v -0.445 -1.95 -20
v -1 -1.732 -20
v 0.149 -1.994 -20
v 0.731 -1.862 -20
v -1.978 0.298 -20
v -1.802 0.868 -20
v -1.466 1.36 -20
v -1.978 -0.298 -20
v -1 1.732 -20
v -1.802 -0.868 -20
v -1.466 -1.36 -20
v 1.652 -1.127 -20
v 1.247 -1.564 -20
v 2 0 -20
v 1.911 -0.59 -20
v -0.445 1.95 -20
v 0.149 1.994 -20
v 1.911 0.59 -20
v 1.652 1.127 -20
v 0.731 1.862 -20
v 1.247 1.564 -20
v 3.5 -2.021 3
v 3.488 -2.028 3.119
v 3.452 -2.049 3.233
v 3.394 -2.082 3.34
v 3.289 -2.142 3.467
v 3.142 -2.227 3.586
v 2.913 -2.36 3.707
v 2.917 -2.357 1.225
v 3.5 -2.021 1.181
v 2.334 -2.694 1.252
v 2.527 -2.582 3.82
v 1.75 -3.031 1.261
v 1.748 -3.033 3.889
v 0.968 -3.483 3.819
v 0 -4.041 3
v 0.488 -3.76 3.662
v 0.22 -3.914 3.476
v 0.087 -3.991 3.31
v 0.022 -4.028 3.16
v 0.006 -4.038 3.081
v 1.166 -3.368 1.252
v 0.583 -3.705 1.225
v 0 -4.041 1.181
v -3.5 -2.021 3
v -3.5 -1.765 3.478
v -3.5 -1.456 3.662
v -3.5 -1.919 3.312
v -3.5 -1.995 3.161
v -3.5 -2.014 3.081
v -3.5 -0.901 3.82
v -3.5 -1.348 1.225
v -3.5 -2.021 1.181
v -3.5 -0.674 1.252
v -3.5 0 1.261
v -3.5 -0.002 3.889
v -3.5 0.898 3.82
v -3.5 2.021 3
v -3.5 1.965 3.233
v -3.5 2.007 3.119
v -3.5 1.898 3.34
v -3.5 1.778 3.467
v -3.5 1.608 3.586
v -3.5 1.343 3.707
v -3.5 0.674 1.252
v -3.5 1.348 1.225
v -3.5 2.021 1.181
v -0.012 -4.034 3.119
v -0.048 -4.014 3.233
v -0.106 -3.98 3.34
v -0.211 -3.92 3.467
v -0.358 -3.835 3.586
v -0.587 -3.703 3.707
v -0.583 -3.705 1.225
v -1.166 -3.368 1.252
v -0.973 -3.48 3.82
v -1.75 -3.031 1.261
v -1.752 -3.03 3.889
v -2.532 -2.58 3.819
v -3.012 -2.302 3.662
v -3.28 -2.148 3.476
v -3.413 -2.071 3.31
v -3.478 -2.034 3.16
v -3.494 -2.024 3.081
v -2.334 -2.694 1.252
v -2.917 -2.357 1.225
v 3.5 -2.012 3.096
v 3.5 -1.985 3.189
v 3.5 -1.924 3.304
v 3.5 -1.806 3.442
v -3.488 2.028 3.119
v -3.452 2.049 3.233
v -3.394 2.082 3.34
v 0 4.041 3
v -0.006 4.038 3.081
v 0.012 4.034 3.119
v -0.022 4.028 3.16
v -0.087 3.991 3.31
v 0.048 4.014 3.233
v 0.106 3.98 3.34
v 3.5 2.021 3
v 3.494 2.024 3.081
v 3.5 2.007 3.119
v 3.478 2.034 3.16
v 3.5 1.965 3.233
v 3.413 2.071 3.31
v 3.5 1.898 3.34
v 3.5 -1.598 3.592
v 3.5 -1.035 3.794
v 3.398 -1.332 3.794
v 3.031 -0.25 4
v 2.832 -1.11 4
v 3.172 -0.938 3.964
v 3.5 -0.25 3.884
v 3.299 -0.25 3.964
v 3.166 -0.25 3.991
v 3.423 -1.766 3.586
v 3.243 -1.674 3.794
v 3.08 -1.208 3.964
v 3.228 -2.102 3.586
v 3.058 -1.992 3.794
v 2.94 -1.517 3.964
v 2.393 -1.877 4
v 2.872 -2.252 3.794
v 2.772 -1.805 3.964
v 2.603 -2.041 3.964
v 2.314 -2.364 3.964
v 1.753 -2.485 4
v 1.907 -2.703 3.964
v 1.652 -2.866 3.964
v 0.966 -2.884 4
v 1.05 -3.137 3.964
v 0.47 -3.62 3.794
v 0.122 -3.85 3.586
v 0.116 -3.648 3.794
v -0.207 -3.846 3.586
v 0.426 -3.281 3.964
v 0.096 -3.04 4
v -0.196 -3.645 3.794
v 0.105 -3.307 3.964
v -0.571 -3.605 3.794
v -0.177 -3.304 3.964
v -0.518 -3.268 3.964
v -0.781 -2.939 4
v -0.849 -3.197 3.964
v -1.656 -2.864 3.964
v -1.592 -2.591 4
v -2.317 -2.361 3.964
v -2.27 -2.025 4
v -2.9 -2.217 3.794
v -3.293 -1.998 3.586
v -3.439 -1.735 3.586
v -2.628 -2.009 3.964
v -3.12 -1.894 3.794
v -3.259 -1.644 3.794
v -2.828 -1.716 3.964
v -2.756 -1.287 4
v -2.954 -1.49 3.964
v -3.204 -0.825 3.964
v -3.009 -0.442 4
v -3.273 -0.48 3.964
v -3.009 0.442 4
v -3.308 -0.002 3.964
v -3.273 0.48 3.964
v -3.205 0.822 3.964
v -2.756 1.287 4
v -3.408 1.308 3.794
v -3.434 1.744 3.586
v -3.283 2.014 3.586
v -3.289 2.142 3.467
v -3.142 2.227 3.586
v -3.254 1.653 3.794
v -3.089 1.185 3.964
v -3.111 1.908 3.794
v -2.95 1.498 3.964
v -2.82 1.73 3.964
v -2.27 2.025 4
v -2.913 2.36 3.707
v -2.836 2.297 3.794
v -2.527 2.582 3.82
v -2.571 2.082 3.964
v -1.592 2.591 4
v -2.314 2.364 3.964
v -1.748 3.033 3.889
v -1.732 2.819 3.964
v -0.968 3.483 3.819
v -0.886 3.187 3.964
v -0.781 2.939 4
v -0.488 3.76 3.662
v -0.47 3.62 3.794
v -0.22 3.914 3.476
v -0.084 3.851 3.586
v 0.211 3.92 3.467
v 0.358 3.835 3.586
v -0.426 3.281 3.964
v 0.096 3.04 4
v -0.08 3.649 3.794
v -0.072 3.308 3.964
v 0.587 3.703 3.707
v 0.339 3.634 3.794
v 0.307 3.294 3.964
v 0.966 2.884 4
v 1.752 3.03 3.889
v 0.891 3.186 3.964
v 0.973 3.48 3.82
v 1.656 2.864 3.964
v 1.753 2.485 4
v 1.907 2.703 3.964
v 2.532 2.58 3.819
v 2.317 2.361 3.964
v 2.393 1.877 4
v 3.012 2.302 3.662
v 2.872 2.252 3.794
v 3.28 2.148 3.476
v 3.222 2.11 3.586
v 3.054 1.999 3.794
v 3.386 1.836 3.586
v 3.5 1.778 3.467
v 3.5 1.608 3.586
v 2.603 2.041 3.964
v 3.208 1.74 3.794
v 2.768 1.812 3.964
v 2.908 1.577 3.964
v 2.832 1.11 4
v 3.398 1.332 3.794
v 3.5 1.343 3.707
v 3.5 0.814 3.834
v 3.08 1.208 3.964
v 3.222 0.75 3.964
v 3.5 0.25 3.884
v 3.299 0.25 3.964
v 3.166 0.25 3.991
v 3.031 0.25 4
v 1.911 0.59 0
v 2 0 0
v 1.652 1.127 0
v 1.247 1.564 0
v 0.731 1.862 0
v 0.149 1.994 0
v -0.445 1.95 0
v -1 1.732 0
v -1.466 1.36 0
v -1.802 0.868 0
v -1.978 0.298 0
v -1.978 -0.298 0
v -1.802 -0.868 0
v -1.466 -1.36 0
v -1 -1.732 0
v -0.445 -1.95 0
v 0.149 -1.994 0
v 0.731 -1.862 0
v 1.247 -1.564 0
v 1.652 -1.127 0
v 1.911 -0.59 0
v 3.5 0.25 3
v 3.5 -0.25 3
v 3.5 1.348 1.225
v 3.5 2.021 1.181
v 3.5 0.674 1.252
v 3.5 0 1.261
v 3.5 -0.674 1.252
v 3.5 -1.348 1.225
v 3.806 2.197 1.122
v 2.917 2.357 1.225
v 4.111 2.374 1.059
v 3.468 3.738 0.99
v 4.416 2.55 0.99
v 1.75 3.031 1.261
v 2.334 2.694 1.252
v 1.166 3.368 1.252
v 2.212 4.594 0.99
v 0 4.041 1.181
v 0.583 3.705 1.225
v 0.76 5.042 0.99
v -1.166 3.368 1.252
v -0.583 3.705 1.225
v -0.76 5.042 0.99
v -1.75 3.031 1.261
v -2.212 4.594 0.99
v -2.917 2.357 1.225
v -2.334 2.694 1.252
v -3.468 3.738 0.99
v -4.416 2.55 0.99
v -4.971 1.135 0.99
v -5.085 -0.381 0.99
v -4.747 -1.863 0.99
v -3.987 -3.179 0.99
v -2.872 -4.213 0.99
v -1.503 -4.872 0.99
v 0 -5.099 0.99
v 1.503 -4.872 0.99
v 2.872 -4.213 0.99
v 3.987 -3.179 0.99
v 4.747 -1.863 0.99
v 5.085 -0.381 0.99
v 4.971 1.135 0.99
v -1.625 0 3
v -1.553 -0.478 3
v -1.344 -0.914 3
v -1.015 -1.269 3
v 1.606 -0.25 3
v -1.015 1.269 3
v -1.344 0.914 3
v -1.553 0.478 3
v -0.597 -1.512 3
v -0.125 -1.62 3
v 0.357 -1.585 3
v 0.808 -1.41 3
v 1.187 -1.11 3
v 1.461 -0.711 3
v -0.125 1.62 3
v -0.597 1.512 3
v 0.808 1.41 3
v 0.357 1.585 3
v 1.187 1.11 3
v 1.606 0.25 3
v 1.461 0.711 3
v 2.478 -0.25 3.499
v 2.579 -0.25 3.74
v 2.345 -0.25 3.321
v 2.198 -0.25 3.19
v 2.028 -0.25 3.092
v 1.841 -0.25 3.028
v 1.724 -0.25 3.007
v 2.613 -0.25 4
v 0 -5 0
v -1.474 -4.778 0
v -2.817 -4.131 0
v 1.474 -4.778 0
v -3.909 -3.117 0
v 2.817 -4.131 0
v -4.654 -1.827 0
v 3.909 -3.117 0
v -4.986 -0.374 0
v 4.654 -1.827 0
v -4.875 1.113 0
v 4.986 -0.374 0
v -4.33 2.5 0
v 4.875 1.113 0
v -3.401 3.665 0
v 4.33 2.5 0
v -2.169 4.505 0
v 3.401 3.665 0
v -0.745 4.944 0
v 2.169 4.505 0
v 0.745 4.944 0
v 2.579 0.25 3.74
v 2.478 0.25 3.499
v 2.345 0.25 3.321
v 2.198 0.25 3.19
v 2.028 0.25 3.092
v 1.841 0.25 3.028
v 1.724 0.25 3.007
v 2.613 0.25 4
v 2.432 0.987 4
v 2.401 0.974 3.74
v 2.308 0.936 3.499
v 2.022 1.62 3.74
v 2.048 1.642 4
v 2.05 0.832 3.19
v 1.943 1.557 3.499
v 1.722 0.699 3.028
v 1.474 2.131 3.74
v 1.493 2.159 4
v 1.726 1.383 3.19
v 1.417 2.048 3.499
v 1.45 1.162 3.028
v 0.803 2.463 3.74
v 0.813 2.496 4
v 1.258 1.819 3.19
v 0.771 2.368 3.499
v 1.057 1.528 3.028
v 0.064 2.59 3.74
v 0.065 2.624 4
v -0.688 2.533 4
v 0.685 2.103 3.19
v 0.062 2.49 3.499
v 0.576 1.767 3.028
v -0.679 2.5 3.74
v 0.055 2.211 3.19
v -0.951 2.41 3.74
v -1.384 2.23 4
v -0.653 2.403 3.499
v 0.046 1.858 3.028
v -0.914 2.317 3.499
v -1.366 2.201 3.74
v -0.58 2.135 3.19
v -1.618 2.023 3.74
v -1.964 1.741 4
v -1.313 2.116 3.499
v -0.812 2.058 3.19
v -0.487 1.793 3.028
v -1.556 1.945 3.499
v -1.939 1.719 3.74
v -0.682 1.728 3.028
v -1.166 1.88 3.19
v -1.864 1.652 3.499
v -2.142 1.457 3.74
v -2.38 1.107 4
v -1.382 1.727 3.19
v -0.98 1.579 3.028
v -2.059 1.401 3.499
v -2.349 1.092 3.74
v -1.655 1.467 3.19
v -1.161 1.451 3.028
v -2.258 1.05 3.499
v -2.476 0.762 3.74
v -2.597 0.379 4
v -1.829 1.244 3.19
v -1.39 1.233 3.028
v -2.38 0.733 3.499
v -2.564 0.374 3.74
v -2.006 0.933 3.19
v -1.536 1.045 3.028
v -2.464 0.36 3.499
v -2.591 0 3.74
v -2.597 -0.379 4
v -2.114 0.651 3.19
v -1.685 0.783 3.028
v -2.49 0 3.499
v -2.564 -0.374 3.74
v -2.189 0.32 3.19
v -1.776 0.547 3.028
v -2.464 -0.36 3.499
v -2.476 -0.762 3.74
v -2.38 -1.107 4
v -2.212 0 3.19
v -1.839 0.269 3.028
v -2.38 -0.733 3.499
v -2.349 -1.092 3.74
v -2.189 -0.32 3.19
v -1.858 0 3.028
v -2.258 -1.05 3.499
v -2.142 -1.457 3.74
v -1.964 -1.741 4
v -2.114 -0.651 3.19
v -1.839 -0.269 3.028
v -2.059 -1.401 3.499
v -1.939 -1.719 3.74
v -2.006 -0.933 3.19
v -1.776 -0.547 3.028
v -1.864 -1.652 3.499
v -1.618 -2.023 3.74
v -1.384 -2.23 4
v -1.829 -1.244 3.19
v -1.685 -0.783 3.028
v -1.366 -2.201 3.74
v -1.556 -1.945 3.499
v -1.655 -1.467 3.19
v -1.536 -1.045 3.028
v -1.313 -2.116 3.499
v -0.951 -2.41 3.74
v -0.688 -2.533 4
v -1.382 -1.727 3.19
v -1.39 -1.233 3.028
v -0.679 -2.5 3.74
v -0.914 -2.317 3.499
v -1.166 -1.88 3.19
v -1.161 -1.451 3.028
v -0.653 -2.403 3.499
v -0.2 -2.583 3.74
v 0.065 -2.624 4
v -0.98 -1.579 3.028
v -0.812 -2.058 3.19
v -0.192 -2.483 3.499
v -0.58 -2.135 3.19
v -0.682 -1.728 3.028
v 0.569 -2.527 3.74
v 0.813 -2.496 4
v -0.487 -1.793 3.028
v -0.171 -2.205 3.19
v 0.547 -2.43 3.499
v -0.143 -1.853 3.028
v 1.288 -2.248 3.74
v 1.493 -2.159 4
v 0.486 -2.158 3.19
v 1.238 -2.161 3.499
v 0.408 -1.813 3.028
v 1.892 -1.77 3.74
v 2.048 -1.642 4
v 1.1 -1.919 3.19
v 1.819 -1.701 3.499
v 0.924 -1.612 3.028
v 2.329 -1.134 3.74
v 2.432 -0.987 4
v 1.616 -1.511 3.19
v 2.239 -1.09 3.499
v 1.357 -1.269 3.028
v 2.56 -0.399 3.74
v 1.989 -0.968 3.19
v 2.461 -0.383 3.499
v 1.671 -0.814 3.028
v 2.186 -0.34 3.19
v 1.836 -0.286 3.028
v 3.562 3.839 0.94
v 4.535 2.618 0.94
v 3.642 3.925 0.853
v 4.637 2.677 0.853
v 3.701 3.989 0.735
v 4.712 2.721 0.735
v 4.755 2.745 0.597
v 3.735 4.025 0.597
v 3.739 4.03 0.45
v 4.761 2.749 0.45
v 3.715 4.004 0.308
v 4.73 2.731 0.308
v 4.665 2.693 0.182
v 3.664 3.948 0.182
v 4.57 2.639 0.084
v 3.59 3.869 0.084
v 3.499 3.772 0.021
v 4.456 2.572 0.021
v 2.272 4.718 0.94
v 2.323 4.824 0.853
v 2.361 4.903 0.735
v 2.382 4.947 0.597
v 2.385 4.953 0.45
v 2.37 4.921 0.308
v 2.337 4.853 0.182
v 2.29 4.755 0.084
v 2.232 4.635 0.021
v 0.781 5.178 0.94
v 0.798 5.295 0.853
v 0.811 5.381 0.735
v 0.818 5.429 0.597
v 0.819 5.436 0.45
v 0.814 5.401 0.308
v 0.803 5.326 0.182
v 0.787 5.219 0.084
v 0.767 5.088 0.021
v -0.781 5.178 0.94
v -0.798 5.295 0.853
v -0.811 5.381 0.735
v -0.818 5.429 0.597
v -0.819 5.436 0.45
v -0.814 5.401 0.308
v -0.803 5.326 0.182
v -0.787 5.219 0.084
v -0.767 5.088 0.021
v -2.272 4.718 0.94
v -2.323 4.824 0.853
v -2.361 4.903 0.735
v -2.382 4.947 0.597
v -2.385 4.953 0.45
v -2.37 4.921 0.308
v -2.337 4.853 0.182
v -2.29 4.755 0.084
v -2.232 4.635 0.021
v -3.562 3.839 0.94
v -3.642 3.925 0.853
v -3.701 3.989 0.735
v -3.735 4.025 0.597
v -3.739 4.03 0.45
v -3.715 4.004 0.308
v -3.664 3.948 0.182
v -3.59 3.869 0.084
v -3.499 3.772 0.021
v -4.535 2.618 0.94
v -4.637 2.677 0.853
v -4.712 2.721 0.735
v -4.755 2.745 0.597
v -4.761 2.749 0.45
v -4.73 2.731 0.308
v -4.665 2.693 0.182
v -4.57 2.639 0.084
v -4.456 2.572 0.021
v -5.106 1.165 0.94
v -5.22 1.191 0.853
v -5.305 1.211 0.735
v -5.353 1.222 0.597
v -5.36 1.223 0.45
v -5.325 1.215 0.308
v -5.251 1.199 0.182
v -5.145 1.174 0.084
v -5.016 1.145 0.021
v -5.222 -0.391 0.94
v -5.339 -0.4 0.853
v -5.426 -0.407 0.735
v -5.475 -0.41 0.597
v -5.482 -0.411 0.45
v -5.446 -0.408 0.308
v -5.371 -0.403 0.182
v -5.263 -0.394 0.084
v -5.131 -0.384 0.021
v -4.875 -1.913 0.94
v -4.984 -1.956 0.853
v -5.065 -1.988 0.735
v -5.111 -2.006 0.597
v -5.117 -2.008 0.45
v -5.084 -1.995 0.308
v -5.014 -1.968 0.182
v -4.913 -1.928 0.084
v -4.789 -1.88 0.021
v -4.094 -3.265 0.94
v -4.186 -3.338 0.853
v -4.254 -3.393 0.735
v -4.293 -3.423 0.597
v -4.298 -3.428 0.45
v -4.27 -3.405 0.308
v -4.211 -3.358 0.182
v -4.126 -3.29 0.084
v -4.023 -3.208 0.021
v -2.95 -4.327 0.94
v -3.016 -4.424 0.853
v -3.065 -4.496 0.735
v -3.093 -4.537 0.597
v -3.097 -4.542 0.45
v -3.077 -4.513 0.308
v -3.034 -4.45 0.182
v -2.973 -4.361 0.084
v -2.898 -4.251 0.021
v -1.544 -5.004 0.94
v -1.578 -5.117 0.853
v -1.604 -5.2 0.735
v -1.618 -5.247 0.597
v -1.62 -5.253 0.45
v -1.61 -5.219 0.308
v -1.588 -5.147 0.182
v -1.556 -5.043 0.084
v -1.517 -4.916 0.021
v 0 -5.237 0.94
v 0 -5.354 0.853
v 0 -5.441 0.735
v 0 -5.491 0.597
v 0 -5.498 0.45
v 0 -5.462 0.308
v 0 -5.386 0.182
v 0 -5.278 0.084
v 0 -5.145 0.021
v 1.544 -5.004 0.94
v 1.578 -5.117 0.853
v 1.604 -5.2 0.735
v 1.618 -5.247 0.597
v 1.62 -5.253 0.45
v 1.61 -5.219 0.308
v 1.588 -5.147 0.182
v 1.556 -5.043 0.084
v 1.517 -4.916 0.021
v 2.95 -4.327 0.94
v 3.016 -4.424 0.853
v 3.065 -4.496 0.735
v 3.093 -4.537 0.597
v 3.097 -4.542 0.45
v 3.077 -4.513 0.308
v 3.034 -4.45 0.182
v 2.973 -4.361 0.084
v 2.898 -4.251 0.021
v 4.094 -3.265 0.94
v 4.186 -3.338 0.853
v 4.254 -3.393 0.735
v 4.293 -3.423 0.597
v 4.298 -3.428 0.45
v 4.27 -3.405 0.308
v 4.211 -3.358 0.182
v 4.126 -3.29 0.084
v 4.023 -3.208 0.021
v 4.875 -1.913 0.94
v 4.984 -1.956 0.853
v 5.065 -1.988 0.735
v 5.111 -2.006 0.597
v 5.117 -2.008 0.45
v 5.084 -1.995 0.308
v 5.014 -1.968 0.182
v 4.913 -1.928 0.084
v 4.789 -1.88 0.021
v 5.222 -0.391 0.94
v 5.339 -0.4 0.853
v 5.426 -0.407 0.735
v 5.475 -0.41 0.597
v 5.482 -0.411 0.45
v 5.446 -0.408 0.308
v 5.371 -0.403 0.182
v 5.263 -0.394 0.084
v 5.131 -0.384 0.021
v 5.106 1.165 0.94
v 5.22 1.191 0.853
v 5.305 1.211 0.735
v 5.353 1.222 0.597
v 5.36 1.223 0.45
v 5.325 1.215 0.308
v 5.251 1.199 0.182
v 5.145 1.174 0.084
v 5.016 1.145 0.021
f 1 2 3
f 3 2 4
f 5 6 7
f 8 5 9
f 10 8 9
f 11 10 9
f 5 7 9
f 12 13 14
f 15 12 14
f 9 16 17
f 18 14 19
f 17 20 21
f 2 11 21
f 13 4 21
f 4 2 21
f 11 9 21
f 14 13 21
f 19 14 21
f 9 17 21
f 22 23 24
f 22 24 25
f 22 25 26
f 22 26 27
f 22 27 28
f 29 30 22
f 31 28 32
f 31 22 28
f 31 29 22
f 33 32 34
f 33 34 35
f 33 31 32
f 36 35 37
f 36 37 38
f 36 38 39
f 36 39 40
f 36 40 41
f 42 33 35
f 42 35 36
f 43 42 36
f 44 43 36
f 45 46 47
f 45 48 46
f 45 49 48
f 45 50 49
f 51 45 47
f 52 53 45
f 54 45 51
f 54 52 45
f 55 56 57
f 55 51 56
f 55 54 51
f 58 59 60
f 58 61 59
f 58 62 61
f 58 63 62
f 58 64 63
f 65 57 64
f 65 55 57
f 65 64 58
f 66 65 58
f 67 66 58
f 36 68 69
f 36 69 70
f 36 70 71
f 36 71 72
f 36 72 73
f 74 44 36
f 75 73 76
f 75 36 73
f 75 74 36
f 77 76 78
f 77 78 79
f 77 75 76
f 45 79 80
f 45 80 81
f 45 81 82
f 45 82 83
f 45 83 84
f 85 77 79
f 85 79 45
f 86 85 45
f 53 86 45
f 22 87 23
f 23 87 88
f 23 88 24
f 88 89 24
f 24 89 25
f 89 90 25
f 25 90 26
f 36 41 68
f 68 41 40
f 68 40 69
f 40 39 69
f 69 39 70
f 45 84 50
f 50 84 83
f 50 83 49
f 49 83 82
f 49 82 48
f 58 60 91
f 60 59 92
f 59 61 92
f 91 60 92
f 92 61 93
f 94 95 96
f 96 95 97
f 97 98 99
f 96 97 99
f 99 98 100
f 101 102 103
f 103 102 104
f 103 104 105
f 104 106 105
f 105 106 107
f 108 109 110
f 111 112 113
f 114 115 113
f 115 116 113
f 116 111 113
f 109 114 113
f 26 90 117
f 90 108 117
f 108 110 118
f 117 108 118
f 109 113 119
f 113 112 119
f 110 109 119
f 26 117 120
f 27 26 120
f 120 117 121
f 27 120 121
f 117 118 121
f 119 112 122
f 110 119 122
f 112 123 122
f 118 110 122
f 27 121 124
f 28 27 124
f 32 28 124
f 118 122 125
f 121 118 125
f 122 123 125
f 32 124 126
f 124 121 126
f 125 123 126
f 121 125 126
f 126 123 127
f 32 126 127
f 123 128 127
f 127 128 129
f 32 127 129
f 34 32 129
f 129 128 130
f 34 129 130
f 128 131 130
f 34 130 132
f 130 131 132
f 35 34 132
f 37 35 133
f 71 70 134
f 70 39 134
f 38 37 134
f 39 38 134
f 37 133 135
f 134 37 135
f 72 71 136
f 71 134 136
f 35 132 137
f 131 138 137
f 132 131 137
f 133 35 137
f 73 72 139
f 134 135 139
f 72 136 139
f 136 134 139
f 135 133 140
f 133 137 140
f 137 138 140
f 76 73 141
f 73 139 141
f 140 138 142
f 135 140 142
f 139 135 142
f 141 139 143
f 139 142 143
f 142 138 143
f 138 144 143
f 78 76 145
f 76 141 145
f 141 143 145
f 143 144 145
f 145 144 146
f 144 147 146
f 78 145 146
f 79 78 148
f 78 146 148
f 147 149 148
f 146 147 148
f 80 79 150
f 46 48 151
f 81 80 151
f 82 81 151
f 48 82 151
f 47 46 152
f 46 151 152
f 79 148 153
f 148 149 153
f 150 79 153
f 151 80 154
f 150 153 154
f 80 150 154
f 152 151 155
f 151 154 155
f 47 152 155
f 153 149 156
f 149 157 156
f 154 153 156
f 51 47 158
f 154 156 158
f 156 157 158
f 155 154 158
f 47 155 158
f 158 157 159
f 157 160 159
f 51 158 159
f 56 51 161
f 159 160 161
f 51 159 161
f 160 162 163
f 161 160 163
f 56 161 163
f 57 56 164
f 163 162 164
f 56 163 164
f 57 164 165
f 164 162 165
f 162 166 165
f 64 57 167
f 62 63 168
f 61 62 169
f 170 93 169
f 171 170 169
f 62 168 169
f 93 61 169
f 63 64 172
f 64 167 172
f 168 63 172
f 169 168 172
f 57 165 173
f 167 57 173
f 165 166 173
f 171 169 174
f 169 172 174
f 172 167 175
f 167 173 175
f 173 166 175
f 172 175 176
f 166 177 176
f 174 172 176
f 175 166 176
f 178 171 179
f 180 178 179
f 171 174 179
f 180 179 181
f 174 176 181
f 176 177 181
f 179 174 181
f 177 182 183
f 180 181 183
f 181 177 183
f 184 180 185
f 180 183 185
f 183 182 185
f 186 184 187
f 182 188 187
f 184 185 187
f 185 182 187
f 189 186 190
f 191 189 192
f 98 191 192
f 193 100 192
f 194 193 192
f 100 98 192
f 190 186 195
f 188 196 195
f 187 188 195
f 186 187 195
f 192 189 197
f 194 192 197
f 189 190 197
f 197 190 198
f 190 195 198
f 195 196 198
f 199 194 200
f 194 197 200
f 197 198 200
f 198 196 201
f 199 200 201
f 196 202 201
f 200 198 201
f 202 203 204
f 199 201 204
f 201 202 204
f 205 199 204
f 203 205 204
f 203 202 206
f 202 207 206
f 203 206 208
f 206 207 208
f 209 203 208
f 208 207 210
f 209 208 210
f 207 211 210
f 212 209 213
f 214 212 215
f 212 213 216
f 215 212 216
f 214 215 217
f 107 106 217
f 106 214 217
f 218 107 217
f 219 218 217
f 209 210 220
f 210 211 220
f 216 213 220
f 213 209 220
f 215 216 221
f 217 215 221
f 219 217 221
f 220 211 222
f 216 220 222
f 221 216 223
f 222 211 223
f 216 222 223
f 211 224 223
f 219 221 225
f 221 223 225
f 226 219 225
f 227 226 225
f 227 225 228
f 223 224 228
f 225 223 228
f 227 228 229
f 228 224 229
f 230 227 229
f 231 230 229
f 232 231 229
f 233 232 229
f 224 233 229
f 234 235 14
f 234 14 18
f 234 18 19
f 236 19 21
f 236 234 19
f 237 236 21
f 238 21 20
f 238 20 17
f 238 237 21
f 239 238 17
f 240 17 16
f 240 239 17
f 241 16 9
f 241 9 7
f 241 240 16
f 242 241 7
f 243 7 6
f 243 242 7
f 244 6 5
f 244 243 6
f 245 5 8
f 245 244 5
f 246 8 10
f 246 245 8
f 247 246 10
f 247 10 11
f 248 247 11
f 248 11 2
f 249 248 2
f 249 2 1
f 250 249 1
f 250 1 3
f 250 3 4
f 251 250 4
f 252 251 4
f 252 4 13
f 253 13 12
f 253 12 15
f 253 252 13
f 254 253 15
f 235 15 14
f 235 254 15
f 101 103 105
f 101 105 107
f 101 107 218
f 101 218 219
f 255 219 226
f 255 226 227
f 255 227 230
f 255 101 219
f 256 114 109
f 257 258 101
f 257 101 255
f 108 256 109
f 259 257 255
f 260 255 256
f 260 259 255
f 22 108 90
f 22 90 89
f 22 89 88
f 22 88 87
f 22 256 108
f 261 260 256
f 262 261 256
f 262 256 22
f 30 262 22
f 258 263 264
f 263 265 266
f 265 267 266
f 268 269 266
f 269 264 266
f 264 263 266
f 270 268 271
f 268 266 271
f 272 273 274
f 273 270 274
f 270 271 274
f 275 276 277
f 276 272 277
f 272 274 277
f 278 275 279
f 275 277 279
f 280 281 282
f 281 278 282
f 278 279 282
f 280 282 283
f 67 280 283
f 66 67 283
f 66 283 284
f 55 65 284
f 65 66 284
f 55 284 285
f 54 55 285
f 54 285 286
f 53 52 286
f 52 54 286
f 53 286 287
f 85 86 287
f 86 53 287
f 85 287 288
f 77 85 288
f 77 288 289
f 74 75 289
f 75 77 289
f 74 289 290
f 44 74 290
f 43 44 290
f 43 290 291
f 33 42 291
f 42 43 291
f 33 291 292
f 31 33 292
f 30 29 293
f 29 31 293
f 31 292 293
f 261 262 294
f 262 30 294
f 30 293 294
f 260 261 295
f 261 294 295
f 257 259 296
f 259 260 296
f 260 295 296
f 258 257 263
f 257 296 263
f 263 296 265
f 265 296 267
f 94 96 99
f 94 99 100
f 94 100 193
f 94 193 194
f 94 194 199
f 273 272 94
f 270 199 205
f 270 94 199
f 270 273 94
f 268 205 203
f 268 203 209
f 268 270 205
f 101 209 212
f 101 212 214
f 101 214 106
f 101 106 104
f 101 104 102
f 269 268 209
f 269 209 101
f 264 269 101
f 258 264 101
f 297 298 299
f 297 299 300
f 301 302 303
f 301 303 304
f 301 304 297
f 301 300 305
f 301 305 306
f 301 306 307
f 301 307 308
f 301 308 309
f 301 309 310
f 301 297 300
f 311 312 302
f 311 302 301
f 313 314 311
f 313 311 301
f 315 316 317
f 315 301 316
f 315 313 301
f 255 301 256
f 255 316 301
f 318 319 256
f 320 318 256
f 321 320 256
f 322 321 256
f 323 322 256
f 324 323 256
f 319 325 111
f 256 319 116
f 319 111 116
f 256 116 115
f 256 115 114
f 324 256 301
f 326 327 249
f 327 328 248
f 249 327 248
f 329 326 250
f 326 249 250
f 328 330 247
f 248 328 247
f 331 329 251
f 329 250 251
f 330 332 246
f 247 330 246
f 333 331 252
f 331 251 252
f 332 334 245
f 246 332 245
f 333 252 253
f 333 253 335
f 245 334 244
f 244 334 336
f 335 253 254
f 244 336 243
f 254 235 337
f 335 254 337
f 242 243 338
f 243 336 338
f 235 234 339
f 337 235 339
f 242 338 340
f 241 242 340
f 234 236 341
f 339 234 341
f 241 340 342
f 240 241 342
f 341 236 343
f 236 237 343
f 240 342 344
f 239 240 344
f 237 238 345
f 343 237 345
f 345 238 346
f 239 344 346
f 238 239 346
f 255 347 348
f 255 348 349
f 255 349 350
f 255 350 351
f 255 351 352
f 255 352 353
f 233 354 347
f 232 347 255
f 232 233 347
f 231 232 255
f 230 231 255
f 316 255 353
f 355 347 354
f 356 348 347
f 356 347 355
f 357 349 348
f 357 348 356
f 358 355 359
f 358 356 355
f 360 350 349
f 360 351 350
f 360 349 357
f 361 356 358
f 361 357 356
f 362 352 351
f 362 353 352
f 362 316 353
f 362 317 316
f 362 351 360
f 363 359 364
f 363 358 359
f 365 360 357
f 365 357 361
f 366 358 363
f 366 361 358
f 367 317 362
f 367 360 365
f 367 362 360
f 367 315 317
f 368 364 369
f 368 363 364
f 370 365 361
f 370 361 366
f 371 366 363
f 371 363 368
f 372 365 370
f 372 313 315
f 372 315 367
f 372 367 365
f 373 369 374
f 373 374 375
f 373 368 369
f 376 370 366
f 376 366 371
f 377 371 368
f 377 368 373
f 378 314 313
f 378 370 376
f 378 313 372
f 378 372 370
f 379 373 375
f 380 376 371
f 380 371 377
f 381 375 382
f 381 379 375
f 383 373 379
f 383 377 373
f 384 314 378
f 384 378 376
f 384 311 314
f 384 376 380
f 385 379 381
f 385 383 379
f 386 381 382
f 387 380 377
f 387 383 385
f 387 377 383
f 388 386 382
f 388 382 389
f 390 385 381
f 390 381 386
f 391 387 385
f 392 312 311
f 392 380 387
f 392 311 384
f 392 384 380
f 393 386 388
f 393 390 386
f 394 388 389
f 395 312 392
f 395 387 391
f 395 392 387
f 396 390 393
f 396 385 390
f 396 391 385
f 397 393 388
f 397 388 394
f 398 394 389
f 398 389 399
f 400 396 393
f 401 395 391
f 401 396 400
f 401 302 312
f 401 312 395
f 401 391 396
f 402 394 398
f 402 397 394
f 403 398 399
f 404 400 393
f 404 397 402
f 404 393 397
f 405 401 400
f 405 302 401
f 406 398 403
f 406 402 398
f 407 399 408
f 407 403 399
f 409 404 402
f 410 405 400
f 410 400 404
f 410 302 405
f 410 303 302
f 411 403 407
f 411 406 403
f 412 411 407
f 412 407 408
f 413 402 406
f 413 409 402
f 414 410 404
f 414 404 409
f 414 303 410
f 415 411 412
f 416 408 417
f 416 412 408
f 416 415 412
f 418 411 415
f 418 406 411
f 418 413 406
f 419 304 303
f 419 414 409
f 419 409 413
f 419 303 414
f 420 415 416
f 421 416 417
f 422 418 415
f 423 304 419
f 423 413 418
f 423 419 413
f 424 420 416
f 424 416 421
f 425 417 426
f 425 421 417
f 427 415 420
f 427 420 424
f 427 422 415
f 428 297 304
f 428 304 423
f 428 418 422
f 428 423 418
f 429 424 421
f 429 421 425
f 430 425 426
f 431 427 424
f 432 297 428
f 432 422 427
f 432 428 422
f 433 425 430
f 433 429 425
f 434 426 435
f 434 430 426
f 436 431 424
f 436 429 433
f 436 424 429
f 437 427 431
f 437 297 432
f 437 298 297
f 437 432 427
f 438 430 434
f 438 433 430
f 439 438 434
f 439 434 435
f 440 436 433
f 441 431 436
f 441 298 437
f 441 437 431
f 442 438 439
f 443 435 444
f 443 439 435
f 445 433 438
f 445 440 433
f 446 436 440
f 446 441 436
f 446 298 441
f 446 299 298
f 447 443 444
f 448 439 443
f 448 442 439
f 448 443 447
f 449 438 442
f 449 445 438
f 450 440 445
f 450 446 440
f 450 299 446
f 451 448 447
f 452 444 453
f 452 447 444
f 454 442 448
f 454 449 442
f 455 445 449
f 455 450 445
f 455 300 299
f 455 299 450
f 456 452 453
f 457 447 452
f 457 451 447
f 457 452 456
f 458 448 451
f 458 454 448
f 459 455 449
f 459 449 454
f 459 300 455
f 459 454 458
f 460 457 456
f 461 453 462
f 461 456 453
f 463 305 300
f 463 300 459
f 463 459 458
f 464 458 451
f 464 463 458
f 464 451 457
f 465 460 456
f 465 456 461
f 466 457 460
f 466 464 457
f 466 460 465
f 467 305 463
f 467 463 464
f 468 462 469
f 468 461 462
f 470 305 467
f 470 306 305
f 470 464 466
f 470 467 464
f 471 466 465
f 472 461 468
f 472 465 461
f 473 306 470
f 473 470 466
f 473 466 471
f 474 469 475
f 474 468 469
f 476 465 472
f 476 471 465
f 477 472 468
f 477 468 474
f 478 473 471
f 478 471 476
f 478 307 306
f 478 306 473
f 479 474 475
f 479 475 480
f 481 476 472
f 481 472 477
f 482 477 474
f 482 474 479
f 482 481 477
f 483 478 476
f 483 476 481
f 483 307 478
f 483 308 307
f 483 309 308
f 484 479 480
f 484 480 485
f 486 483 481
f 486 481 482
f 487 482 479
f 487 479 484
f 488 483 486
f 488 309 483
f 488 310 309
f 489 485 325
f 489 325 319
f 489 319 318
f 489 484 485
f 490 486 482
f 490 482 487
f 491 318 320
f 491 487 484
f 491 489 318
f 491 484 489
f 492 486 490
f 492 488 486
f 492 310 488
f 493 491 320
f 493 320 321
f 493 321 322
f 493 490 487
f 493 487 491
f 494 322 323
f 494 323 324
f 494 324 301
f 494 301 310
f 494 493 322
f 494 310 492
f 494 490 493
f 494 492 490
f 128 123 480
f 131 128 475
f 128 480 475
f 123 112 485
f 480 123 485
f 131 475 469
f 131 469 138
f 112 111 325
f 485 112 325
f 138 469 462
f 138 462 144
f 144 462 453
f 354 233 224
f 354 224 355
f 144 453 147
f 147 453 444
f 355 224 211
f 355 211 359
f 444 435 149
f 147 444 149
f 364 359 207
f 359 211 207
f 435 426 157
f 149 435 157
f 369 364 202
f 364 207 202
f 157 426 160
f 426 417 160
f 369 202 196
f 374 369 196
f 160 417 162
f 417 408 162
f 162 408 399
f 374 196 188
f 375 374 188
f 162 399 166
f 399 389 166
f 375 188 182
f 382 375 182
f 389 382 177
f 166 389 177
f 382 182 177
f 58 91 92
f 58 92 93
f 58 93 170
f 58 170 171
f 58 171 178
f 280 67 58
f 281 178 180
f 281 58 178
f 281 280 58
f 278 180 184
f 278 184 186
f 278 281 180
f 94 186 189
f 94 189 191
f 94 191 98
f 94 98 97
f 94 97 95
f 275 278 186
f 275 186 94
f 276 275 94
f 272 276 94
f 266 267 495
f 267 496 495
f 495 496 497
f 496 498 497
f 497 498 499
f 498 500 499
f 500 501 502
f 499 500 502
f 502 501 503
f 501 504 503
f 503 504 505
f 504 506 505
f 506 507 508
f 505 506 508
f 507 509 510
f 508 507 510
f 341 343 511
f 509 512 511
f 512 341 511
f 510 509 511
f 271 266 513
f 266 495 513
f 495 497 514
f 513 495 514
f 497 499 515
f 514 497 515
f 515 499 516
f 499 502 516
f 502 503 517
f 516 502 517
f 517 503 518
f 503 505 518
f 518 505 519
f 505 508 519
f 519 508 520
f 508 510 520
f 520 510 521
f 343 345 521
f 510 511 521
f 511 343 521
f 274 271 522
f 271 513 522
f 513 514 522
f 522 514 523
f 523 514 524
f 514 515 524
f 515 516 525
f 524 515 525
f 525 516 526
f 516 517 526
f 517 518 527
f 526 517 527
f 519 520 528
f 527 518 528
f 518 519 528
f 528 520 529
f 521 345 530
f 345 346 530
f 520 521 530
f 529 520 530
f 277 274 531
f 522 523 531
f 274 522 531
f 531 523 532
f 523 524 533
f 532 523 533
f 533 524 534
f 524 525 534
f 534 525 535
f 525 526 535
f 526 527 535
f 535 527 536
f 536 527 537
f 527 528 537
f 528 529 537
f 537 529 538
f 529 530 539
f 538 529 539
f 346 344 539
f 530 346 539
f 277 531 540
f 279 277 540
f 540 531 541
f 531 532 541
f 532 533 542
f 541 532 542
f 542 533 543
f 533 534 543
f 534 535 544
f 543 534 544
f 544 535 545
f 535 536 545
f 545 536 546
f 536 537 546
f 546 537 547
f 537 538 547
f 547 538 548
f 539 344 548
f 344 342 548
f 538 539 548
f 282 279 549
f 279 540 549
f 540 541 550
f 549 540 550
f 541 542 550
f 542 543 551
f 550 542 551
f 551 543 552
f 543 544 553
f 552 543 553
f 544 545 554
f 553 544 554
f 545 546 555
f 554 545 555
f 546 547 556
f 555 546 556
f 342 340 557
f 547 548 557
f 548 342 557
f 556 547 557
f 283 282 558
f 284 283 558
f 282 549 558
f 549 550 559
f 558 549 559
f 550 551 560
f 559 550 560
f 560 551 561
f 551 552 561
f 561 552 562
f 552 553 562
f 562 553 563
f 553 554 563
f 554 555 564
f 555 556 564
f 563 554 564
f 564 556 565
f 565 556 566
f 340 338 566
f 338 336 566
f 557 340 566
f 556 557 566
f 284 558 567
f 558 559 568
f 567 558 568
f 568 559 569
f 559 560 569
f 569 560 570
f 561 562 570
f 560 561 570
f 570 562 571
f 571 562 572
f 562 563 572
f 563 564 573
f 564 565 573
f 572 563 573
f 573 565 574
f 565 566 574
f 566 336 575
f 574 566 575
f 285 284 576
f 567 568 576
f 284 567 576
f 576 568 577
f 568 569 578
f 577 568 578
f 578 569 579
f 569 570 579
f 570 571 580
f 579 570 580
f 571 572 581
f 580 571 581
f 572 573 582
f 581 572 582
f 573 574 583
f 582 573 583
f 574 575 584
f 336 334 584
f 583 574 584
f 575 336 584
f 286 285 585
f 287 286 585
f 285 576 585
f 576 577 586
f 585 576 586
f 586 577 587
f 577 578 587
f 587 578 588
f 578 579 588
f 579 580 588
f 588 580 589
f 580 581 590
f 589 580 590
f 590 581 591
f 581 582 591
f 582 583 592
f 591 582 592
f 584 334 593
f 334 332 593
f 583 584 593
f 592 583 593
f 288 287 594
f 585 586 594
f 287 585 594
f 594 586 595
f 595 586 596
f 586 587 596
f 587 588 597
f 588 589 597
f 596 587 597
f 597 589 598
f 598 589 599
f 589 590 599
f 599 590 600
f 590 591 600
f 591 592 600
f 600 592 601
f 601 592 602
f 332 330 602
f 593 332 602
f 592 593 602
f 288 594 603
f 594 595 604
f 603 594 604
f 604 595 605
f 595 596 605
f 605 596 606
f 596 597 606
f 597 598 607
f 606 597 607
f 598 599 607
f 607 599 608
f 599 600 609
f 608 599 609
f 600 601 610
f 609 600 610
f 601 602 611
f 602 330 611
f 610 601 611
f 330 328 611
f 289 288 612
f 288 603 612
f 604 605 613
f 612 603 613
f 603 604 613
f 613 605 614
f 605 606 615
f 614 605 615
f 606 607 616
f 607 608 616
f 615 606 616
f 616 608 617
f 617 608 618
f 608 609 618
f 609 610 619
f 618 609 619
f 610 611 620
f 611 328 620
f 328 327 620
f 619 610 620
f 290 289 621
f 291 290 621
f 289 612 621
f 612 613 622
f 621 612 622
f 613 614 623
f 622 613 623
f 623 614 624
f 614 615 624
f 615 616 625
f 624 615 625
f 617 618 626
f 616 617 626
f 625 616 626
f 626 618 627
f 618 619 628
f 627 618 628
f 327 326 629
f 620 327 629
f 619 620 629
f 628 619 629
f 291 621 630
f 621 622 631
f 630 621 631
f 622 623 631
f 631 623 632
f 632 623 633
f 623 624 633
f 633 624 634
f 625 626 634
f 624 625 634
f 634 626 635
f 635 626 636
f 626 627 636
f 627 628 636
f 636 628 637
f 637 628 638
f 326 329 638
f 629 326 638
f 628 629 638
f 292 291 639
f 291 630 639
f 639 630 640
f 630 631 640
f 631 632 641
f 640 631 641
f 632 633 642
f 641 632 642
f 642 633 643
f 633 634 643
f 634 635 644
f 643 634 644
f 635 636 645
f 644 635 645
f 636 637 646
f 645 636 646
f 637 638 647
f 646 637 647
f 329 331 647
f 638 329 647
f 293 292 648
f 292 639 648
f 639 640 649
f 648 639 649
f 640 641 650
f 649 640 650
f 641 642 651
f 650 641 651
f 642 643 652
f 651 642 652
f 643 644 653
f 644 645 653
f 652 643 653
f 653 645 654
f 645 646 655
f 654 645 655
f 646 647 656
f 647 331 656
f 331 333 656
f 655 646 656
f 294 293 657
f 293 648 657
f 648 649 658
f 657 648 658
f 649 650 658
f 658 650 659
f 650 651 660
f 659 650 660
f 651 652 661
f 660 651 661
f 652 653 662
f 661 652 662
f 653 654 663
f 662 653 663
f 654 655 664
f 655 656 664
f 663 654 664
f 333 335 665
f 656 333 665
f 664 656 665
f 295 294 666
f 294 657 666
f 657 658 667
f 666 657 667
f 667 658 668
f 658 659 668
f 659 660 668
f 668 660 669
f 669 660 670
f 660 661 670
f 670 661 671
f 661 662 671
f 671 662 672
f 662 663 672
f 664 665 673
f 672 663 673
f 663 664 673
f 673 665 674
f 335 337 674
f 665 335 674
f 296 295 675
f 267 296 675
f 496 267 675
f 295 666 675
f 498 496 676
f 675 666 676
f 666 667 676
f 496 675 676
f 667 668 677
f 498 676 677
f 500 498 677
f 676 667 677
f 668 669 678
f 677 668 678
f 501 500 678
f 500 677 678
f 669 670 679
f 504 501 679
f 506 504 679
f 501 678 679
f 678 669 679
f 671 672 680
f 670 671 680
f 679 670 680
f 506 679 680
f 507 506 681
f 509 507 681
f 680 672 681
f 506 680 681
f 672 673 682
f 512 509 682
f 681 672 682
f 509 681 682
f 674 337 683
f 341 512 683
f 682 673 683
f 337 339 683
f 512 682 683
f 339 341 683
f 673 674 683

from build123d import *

# Parameters (mm, degrees)
HEAD_DEPTH         = 4
SHANK_SKETCH_R     = 2
SHANK_DEPTH        = 20
SKETCH6_R          = 2.625
HEAD_CUT_DEPTH     = 1
FILLET1_R          = 1
SKETCH8_W          = 3.5
SKETCH8_H          = 0.5
CUT_EXTRUDE3_DEPTH = 1


with BuildPart() as part:
    # Head Sketch → Head (new body)
    with BuildSketch(Plane.XY):
        Polygon((0, 4.041451884), (3.5, 2.020725942), (3.5, -2.020725942), (0, -4.041451884), (-3.5, -2.020725942), (-3.5, 2.020725942), align=None)
    extrude(amount=HEAD_DEPTH)

    # Shank Sketch → Shank (add)
    with BuildSketch(Plane.XY):
        Circle(SHANK_SKETCH_R)
    extrude(amount=-SHANK_DEPTH)

    # Sketch3 → Flange (revolve)
    with BuildSketch(Plane(origin=(0, 0, 0), x_dir=(-1, 0, 0), z_dir=(0, 1, 0)), mode=Mode.PRIVATE) as flange_sk:
        with BuildLine():
            Line((-5, 0), (0, 0))
            Line((0, 0), (0, 1.5))
            ThreePointArc((0, 1.5), (-2.562220765, 1.372207648), (-5.099009901, 0.99009901))
            ThreePointArc((-5.099009901, 0.99009901), (-5.497518595, 0.45024814), (-5, 0))
        make_face()
    revolve(flange_sk.sketch.rotate(Axis((0, 0, 0), (0, 0, 1)), 30), axis=Axis((0, 0, 0), (0, 0, 1)))

    # Sketch5 → Head Trim (revolve, cut)
    with BuildSketch(Plane(origin=(0, 0, 0), x_dir=(0, 0, -1), z_dir=(1, 0, 0)), mode=Mode.PRIVATE) as head_trim_sk:
        with BuildLine():
            Line((-4, -3.041451884), (-4, -4.041451884))
            Line((-4, -4.041451884), (-3, -4.041451884))
            ThreePointArc((-3, -4.041451884), (-3.707106781, -3.748558666), (-4, -3.041451884))
        make_face()
    revolve(head_trim_sk.sketch.rotate(Axis((0, 0, 15.085599173), (0, 0, -1)), 90), axis=Axis((0, 0, 15.085599173), (0, 0, -1)), mode=Mode.SUBTRACT)

    # Sketch6 → Head Cut (cut)
    with BuildSketch(Plane.XY.offset(4)):
        Circle(SKETCH6_R)
    extrude(amount=-HEAD_CUT_DEPTH, mode=Mode.SUBTRACT)

    # Fillet1
    fillet1_edges = [part.edges().sort_by_distance(p)[0] for p in [
        (-2.625, 0, 3),
    ]]
    fillet(fillet1_edges, radius=FILLET1_R - 0.0001)  # a hair under: the kernel refuses the full size

    # Sketch8 → Cut-Extrude3 (cut)
    with BuildSketch(Plane.XY.offset(4)):
        with Locations((1.75, 0)):
            Rectangle(SKETCH8_W, SKETCH8_H)
    extrude(amount=-CUT_EXTRUDE3_DEPTH, mode=Mode.SUBTRACT)


solid = part.part
